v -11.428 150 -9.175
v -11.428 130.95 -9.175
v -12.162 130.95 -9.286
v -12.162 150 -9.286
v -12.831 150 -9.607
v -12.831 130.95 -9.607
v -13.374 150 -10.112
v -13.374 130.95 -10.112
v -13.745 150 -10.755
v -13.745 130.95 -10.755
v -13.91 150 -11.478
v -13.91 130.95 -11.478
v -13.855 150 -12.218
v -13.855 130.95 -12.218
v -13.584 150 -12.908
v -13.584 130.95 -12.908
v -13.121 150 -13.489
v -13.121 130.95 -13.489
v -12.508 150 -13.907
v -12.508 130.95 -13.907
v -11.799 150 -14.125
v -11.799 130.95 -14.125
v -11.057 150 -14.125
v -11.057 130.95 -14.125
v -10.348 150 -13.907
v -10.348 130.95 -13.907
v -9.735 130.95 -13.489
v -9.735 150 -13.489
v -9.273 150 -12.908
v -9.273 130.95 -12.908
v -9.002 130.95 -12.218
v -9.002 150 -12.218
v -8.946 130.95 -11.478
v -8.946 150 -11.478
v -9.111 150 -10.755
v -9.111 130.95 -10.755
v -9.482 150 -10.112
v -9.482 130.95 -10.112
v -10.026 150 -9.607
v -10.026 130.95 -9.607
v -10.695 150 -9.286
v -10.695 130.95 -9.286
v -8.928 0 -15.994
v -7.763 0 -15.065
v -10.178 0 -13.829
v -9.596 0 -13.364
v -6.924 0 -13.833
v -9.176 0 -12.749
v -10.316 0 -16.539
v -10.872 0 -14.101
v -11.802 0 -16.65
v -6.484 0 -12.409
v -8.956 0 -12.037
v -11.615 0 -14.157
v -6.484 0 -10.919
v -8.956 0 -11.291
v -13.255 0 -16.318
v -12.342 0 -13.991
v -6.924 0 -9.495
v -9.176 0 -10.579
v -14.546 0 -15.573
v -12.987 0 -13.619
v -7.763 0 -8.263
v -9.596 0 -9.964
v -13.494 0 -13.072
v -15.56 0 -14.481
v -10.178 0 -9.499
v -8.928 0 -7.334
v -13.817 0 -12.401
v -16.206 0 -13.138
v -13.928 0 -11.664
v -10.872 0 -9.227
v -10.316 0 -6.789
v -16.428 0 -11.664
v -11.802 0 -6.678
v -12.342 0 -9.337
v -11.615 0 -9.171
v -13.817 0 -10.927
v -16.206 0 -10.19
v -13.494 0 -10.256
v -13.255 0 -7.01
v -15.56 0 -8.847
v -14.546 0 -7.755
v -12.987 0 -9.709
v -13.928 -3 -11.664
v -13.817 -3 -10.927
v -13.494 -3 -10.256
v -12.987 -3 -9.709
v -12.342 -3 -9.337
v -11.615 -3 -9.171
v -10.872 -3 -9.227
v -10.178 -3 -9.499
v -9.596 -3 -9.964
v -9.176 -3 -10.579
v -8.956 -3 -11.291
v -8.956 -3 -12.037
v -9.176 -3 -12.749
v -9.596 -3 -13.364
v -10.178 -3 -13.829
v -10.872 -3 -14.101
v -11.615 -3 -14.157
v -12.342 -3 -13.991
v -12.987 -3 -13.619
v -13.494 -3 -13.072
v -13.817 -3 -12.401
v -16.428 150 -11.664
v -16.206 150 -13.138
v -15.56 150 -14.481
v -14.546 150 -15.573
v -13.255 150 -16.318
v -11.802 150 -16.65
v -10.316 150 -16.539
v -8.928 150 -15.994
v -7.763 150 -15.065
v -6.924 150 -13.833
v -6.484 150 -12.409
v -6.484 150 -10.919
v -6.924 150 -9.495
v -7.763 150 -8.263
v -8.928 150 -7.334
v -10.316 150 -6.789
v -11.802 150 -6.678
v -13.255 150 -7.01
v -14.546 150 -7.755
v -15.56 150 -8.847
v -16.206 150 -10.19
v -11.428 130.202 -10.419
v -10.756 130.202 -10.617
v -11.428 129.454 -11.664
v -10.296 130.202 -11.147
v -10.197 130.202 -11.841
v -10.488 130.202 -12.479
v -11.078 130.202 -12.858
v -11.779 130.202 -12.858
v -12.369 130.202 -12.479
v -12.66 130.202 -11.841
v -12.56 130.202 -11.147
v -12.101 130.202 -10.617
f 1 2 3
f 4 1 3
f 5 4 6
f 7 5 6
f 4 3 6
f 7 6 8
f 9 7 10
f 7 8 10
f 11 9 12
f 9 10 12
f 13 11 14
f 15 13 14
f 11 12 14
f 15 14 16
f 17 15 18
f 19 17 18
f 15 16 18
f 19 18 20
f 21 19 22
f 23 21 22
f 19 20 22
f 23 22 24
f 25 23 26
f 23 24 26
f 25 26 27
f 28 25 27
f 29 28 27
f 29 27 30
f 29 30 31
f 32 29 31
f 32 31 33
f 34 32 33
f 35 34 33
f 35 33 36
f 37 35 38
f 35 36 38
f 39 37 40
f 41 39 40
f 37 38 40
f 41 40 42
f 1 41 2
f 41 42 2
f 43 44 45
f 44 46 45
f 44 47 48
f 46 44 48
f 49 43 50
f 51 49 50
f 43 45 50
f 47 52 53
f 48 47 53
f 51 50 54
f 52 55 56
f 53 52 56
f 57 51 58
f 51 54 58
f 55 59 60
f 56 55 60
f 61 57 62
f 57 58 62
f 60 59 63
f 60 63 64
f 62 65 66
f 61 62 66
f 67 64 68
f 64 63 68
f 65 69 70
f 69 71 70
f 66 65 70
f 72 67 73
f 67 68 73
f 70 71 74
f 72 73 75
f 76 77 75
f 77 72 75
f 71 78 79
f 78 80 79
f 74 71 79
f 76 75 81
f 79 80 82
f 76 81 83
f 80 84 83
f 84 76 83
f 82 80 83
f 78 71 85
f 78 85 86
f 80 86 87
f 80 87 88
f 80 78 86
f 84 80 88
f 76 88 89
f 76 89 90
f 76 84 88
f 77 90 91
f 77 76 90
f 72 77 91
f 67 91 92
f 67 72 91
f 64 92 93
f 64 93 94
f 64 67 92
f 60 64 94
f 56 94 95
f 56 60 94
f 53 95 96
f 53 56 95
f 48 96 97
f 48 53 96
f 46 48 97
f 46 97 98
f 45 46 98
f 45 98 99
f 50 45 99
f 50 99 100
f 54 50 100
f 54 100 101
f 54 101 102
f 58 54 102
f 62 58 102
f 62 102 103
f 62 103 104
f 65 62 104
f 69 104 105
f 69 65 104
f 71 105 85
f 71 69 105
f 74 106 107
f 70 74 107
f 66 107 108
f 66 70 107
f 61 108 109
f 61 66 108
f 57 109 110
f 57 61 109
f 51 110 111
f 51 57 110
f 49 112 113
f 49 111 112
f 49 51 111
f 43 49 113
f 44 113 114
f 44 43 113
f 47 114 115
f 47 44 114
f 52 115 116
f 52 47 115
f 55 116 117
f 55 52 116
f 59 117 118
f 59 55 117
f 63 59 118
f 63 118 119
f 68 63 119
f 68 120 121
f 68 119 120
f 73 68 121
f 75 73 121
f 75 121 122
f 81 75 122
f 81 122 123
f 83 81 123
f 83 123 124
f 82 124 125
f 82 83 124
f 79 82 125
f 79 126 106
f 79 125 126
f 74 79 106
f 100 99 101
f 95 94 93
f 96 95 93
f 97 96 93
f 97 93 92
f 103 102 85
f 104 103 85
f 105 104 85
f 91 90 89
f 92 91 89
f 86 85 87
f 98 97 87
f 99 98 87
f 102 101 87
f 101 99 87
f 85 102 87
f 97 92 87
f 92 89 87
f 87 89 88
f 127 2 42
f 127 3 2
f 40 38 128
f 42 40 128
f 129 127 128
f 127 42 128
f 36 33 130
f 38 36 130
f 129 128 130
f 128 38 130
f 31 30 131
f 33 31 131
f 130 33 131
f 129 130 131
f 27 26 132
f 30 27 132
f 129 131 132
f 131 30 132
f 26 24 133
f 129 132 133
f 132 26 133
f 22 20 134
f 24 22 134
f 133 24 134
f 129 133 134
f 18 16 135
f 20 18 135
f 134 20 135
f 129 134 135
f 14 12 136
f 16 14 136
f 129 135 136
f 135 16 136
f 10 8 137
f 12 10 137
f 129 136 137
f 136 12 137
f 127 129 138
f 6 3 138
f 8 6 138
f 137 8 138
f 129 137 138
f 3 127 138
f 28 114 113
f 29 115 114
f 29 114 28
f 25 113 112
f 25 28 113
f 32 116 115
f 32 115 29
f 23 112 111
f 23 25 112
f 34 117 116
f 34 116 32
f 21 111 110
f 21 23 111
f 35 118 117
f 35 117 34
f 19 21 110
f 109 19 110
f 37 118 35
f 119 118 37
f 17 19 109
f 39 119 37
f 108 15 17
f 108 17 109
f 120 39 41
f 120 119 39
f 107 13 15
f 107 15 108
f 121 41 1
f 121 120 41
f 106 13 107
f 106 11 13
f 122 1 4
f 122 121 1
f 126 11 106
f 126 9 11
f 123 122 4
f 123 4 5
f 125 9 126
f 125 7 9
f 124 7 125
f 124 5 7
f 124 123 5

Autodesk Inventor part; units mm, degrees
ref_plane "YZ Plane" through (0, 0, 0) normal (1, 0, 0) x (0, 1, 0)
ref_plane "XZ Plane" through (0, 0, 0) normal (0, 1, 0) x (-1, 0, 0)
ref_plane "XY Plane" through (0, 0, 0) normal (0, 0, 1) x (1, 0, 0)
sketch "Skizze1" plane through (0, 0, 0) normal (0, 1, 0) x (-1, 0, 0)
  circle A0 centre (11.4284, -11.664) radius 5
  circle A1 centre (11.4284, -11.664) radius 2.5
  point P0 (0, 0)
  dimension "d0" = 10
  dimension "d1" = 5
extrude "Extrusion1" add sketch "Skizze1" along normal blind 150 contours A0 | A1
extrude "Extrusion2" add sketch "Skizze1" against normal blind 3 contours A1
thread "Gewinde1" size "M5x0.8" class "6g" standard "ANSI Metric M Profile" full length
sketch "Skizze2" plane through (-11.4284, 150, -11.664) normal (0, 1, 0) x (1, 0, 0)
  point P0 (11.4284, -11.664)
  point P1 (0, 0)
hole "Bohrung1" at (-11.4284, 150, -11.664) direction (0, -1, 0) diameter 4.978 depth 19.05 tip angle 118 thread size "1/4-20 UNC" class "2B" standard "ANSI Unified Screw Threads"
properties part number "Stangen"
